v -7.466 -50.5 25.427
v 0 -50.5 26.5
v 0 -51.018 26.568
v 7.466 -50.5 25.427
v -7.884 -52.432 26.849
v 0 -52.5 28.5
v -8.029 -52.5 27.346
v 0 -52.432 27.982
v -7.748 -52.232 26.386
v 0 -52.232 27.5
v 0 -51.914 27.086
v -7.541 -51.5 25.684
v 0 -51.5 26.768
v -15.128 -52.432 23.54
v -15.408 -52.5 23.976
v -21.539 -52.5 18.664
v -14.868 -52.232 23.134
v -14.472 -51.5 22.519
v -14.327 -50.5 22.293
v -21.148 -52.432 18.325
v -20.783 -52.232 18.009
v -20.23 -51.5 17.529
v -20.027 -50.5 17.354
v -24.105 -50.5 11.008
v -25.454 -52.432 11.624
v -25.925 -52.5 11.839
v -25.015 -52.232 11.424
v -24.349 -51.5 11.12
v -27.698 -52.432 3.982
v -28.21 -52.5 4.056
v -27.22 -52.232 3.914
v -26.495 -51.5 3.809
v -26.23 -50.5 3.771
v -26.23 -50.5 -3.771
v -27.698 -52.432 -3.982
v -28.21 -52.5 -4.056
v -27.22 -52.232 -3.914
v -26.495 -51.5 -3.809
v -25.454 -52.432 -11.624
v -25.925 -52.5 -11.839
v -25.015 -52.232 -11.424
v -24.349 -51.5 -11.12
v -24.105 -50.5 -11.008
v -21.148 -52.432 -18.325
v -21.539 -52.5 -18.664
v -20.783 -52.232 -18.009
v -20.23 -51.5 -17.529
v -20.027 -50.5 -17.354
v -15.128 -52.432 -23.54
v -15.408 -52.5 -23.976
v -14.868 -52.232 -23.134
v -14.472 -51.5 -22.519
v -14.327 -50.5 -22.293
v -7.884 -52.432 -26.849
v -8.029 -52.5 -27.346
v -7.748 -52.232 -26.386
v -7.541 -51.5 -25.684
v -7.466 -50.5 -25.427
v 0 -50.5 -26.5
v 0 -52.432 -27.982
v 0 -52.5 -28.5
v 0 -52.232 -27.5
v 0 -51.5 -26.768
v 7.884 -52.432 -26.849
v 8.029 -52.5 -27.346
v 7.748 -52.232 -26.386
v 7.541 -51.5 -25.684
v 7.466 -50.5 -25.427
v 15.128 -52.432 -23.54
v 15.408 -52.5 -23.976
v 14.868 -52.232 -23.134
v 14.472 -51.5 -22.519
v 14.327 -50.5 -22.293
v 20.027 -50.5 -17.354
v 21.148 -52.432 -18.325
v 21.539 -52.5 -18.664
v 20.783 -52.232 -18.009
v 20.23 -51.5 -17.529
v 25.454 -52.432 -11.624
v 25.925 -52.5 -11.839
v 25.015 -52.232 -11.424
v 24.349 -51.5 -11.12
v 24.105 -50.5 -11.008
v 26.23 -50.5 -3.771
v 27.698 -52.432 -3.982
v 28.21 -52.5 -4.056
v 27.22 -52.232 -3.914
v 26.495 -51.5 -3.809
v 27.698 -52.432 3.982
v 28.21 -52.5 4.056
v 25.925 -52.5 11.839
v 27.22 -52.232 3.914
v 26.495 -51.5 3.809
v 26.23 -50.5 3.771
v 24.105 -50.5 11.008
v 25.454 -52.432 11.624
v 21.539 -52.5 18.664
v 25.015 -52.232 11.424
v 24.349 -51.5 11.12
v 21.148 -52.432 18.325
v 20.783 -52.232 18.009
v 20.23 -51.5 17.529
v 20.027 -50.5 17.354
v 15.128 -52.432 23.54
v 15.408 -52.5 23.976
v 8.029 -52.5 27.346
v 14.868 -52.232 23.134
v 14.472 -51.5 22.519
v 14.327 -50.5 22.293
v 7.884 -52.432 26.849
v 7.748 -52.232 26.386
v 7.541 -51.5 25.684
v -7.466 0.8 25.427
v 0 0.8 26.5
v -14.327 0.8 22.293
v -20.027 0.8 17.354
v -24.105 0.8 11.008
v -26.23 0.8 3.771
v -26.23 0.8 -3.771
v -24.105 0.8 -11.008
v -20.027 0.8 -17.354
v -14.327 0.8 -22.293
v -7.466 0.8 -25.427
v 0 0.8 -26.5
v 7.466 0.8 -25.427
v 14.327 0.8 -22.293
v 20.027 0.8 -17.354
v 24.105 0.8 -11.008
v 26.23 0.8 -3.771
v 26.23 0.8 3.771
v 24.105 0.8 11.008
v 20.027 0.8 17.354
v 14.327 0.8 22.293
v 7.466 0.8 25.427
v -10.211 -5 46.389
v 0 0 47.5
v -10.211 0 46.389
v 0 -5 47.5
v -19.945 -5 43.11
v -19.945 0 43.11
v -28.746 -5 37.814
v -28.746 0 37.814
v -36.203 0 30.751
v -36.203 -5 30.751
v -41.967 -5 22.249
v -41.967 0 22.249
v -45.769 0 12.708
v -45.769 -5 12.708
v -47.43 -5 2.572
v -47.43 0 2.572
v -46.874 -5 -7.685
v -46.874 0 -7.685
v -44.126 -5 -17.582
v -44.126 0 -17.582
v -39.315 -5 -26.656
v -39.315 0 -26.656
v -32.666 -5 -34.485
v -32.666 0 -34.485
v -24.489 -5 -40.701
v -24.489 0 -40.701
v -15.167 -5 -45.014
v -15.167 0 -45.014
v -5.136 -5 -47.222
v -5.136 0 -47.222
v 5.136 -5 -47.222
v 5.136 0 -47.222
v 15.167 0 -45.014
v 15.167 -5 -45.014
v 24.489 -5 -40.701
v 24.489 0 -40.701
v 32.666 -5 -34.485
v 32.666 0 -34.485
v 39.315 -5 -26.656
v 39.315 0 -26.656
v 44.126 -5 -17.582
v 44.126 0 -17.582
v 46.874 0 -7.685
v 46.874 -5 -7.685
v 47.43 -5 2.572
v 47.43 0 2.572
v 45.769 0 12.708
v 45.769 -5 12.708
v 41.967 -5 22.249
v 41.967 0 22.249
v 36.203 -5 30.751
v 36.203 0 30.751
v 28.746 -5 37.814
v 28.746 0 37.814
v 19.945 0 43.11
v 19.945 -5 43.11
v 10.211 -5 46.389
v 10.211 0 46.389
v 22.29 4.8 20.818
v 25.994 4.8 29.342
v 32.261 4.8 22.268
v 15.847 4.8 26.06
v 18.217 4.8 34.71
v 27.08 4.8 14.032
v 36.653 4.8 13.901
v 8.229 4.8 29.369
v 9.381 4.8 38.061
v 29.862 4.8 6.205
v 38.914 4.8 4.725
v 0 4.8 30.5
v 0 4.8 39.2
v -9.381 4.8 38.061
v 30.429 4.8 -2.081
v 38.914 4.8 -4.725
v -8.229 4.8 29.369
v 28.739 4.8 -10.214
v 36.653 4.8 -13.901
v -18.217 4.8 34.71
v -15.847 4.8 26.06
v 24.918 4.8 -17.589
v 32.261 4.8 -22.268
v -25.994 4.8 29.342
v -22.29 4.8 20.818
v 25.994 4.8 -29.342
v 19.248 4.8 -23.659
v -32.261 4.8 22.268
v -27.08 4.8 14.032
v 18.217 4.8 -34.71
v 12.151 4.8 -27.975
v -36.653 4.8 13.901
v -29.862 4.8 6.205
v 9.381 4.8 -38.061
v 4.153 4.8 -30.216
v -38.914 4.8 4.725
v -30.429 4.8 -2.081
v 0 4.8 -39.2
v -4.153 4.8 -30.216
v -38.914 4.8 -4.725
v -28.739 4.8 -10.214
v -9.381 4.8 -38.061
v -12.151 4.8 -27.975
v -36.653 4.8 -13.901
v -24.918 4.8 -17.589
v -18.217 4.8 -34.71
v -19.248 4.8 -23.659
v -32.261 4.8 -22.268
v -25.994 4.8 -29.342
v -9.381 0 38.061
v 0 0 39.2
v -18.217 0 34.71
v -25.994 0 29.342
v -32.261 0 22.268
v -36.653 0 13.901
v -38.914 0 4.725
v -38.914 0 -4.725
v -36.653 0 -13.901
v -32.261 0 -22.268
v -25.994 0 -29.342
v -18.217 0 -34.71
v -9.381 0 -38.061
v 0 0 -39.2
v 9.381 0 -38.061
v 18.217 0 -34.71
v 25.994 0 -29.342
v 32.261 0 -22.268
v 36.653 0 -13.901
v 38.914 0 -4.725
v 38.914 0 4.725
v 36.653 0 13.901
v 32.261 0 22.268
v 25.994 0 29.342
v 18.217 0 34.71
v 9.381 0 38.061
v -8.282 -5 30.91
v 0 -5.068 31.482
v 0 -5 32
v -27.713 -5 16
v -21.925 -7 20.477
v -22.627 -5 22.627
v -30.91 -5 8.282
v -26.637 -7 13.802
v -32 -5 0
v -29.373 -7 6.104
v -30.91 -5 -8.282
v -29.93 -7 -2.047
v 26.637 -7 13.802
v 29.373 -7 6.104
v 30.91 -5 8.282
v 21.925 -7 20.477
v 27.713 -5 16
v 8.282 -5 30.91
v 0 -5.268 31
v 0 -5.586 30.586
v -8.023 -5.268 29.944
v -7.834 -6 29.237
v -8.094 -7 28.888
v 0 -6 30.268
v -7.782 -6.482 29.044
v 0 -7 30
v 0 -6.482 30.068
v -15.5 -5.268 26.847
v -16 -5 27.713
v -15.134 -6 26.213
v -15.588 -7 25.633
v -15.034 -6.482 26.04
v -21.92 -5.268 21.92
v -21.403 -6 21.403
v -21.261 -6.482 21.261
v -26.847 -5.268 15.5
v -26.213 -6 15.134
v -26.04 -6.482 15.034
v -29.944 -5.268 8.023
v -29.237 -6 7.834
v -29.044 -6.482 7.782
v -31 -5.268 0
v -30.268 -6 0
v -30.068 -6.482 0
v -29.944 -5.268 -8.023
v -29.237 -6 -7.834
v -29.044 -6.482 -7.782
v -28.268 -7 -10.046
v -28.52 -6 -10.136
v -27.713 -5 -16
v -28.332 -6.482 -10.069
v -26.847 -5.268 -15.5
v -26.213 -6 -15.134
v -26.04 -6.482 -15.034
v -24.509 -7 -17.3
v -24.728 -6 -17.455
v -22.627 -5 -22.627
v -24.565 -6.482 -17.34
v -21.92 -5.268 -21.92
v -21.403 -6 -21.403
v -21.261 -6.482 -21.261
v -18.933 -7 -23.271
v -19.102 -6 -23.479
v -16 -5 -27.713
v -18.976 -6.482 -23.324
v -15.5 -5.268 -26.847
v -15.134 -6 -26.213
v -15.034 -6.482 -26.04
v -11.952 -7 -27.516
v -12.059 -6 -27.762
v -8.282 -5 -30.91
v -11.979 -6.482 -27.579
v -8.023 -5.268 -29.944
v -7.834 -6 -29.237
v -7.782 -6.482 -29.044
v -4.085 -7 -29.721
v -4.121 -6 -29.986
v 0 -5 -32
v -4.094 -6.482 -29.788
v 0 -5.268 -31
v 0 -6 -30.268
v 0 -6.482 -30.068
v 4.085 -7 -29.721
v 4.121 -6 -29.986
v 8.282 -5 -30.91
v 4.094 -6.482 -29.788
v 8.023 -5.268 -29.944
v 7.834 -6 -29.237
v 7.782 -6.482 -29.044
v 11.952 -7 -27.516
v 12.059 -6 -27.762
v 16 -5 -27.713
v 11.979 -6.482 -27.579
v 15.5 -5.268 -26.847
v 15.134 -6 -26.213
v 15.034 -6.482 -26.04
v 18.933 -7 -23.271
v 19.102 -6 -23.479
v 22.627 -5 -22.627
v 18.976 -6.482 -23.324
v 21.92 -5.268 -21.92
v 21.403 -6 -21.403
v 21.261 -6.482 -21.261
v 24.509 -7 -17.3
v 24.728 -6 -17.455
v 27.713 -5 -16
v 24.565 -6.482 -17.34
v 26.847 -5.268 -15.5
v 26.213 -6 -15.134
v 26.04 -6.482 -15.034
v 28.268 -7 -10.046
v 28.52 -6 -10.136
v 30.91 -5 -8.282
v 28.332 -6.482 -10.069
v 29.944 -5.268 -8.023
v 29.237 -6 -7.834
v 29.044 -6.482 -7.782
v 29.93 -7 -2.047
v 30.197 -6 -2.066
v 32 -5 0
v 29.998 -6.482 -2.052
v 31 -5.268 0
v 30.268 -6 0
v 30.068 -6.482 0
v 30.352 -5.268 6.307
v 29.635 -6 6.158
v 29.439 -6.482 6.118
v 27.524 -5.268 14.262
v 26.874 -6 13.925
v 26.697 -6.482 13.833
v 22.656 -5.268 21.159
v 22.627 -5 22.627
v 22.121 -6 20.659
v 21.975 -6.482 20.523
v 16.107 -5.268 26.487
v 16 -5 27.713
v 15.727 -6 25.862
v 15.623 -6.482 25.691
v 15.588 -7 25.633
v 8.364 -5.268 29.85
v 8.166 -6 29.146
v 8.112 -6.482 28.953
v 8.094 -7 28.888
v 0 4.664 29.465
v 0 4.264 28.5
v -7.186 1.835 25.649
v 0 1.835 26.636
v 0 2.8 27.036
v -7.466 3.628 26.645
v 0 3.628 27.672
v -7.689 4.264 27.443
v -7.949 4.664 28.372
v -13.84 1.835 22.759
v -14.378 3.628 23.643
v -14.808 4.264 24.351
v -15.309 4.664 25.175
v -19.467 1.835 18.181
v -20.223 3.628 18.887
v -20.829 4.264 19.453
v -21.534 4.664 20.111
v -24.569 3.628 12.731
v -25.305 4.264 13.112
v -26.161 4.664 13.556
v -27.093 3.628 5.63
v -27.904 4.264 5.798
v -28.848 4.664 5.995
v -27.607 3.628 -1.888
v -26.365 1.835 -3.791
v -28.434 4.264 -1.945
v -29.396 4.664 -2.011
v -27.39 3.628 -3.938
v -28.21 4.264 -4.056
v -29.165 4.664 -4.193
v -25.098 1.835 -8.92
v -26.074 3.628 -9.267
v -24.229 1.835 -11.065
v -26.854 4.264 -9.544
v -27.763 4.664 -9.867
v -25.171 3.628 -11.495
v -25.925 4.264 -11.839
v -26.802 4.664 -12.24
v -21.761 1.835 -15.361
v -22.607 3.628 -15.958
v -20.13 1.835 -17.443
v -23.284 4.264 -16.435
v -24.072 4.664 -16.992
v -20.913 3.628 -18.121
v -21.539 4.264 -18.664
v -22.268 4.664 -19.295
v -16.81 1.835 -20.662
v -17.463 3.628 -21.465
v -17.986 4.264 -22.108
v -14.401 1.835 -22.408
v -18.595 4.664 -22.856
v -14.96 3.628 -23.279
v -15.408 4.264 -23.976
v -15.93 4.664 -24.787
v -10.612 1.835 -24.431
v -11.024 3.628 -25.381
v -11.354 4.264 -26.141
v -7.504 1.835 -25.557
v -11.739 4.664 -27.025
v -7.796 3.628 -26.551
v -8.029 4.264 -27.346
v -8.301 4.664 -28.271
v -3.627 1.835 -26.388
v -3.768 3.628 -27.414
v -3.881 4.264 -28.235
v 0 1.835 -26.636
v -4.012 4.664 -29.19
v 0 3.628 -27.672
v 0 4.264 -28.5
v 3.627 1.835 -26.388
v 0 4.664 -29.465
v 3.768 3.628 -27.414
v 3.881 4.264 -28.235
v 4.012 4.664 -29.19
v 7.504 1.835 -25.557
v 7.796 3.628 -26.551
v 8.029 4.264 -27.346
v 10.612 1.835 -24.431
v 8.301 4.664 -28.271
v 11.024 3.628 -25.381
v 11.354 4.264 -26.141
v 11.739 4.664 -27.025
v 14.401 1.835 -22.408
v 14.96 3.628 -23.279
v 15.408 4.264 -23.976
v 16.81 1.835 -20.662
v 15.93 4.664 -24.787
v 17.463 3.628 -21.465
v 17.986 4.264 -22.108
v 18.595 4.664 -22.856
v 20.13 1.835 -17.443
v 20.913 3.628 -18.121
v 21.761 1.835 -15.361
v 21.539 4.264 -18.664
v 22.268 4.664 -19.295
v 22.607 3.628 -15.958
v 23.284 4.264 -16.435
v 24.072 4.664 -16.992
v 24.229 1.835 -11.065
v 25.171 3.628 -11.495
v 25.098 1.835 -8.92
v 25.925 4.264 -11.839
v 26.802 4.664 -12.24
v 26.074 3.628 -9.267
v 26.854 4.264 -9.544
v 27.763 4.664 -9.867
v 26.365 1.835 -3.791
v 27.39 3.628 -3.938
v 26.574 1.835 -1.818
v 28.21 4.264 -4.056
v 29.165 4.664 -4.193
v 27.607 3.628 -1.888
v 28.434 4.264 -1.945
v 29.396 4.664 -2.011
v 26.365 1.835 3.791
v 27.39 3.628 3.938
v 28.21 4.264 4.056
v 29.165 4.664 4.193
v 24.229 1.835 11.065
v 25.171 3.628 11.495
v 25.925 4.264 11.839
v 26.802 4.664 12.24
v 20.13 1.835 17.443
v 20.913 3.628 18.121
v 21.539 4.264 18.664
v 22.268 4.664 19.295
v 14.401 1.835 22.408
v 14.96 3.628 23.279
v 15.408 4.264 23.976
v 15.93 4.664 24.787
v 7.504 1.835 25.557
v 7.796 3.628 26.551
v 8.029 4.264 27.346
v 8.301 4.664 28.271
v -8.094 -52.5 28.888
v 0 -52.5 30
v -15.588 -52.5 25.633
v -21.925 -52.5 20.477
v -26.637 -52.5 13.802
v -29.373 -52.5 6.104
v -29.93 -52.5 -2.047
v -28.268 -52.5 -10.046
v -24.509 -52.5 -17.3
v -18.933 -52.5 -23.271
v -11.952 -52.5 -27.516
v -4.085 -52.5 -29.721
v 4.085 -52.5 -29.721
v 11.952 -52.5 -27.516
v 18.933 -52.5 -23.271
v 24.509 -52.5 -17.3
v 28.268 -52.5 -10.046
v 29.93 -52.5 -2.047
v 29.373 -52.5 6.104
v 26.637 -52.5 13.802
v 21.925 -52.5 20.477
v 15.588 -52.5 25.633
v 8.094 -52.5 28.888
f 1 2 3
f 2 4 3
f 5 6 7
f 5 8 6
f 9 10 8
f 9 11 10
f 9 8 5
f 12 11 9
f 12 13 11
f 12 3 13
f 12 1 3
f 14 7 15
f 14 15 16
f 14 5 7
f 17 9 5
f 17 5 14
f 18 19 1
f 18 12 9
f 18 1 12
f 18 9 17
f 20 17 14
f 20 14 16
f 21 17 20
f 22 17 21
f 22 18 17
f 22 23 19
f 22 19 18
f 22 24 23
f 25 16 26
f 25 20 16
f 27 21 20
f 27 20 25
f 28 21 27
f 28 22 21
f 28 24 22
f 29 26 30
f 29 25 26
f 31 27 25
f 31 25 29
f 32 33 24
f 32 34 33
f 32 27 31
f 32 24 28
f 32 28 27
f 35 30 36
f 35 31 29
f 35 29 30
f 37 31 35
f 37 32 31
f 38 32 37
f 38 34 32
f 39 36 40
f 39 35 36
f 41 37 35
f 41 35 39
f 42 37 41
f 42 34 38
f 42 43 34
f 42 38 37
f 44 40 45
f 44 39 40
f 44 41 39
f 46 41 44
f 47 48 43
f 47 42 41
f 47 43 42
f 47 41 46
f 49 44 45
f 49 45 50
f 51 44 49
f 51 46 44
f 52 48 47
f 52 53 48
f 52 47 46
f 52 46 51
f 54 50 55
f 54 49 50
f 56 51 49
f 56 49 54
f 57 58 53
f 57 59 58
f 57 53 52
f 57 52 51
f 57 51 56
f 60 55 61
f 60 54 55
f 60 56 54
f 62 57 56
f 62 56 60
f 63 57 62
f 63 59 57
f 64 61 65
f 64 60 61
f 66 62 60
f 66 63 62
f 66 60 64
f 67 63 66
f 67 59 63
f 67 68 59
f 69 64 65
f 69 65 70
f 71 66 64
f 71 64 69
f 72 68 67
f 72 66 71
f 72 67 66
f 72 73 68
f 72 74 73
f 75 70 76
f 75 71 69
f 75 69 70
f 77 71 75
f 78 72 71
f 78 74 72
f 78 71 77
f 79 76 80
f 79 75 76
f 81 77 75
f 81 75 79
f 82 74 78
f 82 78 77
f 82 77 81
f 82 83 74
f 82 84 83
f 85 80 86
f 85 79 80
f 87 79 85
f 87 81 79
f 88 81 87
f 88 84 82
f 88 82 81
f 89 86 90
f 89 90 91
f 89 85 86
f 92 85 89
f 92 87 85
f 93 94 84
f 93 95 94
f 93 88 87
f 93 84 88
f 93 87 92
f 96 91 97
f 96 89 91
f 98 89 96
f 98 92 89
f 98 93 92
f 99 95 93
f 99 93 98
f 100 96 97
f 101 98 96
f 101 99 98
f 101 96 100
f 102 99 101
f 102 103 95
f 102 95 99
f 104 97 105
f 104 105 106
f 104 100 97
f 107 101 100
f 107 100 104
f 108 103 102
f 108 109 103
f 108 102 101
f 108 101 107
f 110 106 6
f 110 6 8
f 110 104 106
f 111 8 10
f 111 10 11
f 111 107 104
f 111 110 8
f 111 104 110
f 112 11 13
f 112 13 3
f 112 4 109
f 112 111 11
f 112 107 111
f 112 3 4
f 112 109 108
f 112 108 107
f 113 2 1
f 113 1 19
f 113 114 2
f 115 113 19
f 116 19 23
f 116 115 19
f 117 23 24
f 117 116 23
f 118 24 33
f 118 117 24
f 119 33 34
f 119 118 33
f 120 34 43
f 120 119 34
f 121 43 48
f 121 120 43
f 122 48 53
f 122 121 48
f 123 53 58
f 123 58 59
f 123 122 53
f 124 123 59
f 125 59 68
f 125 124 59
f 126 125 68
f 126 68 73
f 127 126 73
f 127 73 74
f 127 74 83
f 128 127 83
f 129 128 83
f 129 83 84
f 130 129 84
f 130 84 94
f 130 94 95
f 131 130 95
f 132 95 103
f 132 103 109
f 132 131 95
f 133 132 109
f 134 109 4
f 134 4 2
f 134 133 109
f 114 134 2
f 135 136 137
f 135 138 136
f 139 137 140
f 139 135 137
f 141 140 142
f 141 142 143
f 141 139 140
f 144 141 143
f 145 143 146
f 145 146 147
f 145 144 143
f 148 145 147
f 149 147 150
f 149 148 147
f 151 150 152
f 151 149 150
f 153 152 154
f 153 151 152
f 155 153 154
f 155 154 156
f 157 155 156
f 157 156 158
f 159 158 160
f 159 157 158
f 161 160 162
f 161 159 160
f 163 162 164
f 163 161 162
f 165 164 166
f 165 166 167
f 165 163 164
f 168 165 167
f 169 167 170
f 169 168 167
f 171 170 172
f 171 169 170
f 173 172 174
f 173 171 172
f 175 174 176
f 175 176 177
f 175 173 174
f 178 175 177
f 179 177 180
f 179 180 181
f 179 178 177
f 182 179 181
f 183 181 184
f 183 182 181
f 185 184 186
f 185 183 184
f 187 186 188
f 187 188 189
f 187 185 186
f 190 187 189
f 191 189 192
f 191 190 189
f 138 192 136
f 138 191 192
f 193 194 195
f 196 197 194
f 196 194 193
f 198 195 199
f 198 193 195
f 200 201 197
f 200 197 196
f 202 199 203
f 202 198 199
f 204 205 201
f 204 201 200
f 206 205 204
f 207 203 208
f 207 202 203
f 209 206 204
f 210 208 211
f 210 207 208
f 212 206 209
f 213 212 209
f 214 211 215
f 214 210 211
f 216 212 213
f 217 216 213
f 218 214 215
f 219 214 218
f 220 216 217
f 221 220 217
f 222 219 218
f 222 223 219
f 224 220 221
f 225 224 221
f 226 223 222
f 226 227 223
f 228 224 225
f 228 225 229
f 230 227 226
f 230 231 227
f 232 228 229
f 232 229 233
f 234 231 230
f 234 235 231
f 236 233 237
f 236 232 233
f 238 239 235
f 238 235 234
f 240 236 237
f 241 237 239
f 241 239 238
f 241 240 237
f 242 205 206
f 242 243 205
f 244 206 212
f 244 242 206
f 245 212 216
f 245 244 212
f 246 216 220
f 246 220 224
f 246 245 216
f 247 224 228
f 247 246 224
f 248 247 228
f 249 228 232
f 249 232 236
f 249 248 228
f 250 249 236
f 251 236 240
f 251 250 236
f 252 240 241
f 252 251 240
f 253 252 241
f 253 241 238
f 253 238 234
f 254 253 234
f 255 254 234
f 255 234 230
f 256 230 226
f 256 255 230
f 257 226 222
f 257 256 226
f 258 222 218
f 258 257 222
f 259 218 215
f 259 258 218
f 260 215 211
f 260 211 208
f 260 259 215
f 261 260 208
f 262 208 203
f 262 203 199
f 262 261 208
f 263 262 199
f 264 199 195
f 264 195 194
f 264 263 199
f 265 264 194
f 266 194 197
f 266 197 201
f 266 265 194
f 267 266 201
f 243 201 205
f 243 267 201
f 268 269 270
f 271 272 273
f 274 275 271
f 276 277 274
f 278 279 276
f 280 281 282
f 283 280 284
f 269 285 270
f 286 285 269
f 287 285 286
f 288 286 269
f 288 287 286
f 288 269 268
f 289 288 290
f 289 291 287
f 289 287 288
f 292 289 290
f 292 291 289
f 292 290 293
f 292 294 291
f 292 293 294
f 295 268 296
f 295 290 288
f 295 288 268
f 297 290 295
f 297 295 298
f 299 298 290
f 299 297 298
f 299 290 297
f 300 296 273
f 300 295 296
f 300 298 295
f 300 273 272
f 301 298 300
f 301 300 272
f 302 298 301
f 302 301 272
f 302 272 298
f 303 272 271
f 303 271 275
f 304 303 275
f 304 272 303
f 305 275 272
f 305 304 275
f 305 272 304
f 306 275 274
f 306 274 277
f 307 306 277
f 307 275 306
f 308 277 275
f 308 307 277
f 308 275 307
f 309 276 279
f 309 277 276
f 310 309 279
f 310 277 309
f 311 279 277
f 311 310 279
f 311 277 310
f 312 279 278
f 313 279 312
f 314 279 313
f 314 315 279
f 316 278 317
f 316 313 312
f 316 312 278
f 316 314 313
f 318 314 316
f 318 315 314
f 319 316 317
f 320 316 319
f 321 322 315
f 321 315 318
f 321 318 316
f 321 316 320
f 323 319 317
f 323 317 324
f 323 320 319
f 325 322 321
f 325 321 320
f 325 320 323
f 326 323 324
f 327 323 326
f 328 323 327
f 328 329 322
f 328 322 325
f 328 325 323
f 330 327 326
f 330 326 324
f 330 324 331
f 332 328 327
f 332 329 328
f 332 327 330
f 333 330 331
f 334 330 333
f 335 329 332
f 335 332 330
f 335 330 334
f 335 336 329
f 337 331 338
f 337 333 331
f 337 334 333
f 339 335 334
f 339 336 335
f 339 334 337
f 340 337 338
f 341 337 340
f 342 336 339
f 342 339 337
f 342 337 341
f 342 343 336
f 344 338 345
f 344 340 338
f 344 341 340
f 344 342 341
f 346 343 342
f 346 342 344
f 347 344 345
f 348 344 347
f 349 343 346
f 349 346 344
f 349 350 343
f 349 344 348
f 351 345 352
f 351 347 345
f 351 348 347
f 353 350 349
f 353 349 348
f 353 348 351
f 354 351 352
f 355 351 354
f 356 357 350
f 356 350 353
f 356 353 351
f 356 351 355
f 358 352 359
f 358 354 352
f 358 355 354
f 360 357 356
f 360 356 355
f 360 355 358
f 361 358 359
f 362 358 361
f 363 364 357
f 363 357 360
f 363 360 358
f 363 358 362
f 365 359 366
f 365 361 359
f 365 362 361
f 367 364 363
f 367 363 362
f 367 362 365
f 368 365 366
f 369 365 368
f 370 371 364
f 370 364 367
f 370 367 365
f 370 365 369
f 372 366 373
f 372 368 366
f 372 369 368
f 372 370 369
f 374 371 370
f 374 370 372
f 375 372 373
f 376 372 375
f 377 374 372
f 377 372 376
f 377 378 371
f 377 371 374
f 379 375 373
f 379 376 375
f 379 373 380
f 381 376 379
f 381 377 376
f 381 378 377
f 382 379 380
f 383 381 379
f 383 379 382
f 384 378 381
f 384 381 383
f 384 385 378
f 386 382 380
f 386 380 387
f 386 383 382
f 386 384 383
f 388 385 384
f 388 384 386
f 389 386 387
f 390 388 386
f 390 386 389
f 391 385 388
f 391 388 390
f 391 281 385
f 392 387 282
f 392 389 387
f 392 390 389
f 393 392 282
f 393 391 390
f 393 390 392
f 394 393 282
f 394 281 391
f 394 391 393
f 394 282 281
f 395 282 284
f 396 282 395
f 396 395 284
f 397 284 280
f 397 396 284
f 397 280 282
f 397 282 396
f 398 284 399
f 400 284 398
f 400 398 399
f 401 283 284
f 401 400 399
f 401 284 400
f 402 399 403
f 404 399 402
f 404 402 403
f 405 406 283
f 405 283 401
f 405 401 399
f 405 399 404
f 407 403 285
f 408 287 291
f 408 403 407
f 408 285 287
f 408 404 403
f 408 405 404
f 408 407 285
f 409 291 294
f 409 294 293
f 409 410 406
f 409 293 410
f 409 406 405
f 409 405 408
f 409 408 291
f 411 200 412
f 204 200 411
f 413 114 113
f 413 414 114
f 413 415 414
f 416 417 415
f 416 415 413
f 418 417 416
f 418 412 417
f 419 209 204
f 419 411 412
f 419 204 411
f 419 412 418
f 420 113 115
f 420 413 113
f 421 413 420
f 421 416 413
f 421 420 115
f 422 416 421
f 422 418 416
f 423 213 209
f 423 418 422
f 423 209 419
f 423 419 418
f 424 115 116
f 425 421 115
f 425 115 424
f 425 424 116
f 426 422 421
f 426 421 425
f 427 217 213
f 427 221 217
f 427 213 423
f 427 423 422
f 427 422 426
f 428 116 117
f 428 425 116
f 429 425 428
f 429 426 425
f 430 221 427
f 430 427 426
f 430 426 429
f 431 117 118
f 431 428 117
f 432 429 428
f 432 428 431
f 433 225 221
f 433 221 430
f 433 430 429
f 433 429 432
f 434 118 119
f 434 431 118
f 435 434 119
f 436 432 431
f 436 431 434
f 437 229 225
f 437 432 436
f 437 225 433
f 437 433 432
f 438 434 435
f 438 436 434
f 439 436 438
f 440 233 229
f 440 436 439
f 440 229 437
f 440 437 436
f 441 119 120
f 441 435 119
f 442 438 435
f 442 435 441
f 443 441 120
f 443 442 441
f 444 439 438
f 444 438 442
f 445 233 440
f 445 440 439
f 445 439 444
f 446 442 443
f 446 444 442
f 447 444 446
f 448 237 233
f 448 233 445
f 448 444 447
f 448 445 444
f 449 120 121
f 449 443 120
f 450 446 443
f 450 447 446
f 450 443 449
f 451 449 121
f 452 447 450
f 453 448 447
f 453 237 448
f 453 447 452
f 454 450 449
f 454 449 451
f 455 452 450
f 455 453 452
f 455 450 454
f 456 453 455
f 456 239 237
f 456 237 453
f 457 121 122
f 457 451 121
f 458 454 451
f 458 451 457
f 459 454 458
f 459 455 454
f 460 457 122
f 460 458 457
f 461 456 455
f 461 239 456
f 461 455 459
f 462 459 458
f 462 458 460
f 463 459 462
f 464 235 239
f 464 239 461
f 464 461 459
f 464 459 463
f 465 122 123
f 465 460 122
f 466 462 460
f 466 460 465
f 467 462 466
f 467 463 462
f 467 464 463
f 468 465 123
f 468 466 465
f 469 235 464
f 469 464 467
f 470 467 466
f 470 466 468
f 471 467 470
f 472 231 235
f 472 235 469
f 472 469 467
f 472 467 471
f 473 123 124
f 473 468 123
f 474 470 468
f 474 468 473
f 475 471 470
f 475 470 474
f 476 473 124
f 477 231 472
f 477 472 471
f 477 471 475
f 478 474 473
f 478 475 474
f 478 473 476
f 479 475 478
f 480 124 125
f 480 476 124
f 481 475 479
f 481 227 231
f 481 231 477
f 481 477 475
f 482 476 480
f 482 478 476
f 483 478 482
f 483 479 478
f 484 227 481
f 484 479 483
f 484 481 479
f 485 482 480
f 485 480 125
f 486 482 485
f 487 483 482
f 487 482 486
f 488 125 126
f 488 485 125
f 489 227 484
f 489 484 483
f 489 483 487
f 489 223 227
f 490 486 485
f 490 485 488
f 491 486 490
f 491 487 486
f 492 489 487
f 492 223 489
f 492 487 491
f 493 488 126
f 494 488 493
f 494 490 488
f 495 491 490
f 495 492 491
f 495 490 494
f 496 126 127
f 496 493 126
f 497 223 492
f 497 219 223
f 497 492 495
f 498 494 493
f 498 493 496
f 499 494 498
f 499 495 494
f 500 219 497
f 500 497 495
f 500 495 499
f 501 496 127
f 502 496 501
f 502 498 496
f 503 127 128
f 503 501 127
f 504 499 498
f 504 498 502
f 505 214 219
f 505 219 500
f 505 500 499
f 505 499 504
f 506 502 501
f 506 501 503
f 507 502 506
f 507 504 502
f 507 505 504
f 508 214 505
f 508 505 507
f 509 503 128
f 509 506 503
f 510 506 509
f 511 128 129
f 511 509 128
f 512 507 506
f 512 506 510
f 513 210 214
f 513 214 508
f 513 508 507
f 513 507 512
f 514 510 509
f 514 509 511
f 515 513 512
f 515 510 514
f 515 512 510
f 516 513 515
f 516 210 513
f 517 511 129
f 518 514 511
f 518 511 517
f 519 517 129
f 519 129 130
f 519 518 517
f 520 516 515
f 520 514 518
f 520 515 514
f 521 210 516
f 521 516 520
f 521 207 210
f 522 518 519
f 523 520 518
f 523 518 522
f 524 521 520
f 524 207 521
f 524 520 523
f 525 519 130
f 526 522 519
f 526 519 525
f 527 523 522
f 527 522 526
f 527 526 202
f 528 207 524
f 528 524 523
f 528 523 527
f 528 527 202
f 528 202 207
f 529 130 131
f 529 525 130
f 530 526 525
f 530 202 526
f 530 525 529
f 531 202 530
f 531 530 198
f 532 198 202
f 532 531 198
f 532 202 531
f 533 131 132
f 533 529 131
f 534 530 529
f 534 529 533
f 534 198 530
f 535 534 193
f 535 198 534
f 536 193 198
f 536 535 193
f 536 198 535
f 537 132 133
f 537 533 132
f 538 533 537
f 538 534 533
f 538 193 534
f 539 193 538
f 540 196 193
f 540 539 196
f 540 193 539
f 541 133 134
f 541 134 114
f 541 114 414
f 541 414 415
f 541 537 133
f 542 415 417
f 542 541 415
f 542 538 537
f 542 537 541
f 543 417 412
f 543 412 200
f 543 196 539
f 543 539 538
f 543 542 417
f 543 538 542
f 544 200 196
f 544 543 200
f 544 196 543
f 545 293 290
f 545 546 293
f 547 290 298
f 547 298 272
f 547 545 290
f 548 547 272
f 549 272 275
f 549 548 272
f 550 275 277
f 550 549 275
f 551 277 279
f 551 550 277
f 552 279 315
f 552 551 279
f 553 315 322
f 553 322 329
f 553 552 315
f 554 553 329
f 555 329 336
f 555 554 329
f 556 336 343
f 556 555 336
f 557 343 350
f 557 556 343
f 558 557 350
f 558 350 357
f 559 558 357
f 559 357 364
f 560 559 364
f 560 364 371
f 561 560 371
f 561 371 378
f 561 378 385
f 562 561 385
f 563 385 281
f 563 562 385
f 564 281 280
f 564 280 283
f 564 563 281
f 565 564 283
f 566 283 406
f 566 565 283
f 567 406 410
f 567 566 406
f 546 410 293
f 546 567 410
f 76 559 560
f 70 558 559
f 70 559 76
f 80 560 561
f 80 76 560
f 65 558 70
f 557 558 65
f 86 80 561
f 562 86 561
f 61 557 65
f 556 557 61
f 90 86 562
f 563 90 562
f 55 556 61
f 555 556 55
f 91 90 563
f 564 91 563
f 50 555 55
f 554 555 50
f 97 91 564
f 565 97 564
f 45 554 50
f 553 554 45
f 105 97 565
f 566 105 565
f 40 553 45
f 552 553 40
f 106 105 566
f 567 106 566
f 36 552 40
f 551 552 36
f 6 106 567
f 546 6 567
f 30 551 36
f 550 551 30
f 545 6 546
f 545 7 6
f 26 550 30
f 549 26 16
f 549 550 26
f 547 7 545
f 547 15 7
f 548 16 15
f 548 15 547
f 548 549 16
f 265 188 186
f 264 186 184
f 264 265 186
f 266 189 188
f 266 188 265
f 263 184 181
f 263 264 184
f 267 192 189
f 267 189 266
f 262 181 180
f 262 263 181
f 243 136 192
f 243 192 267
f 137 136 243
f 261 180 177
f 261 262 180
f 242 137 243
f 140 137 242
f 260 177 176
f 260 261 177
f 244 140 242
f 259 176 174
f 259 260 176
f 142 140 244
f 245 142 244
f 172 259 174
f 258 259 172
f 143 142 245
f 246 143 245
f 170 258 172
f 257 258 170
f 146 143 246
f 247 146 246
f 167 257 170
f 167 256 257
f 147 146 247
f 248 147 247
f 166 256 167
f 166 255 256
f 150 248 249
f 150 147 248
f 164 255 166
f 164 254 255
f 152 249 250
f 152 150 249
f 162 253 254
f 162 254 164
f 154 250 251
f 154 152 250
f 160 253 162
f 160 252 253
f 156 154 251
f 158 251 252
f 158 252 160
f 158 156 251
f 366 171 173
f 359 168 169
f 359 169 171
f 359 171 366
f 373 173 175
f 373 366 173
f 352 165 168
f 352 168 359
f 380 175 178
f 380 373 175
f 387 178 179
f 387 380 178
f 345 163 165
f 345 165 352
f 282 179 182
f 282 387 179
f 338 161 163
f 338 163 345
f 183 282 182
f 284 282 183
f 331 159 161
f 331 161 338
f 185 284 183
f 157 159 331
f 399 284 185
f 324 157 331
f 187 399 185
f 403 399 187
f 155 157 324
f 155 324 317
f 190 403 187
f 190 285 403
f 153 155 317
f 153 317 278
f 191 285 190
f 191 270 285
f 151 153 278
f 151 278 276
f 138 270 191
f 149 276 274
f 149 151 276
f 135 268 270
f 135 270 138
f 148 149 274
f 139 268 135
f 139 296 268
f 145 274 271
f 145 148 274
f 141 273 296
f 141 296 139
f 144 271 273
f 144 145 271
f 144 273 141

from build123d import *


# Not quite as in the source:
# - a feature of the source that left no trace in its solid (it failed there, or was rolled back) is left out


with BuildPart() as f1:
    # F0 (on Right) → F1 (revolve)
    with BuildSketch(Plane.YZ):
        with BuildLine():
            Line((4.8, 39.2), (0, 39.2))
            Line((0, 39.2), (0, 47.5))
            Line((0, 47.5), (-5, 47.5))
            Line((-5, 47.5), (-5, 32))
            ThreePointArc((-5, 32), (-5.5857864376, 30.5857864376), (-7, 30))
            Line((-7, 30), (-52.5, 30))
            Line((-52.5, 30), (-52.5, 28.5))
            ThreePointArc((-52.5, 28.5), (-51.9142135624, 27.0857864376), (-50.5, 26.5))
            Line((-50.5, 26.5), (0.8, 26.5))
            ThreePointArc((0.8, 26.5), (3.6284271247, 27.6715728753), (4.8, 30.5))
            Line((4.8, 30.5), (4.8, 39.2))
        make_face()
    revolve(axis=Axis((0, -35.2283529937, 0), (0, -1, 0)))


solid = f1.part
